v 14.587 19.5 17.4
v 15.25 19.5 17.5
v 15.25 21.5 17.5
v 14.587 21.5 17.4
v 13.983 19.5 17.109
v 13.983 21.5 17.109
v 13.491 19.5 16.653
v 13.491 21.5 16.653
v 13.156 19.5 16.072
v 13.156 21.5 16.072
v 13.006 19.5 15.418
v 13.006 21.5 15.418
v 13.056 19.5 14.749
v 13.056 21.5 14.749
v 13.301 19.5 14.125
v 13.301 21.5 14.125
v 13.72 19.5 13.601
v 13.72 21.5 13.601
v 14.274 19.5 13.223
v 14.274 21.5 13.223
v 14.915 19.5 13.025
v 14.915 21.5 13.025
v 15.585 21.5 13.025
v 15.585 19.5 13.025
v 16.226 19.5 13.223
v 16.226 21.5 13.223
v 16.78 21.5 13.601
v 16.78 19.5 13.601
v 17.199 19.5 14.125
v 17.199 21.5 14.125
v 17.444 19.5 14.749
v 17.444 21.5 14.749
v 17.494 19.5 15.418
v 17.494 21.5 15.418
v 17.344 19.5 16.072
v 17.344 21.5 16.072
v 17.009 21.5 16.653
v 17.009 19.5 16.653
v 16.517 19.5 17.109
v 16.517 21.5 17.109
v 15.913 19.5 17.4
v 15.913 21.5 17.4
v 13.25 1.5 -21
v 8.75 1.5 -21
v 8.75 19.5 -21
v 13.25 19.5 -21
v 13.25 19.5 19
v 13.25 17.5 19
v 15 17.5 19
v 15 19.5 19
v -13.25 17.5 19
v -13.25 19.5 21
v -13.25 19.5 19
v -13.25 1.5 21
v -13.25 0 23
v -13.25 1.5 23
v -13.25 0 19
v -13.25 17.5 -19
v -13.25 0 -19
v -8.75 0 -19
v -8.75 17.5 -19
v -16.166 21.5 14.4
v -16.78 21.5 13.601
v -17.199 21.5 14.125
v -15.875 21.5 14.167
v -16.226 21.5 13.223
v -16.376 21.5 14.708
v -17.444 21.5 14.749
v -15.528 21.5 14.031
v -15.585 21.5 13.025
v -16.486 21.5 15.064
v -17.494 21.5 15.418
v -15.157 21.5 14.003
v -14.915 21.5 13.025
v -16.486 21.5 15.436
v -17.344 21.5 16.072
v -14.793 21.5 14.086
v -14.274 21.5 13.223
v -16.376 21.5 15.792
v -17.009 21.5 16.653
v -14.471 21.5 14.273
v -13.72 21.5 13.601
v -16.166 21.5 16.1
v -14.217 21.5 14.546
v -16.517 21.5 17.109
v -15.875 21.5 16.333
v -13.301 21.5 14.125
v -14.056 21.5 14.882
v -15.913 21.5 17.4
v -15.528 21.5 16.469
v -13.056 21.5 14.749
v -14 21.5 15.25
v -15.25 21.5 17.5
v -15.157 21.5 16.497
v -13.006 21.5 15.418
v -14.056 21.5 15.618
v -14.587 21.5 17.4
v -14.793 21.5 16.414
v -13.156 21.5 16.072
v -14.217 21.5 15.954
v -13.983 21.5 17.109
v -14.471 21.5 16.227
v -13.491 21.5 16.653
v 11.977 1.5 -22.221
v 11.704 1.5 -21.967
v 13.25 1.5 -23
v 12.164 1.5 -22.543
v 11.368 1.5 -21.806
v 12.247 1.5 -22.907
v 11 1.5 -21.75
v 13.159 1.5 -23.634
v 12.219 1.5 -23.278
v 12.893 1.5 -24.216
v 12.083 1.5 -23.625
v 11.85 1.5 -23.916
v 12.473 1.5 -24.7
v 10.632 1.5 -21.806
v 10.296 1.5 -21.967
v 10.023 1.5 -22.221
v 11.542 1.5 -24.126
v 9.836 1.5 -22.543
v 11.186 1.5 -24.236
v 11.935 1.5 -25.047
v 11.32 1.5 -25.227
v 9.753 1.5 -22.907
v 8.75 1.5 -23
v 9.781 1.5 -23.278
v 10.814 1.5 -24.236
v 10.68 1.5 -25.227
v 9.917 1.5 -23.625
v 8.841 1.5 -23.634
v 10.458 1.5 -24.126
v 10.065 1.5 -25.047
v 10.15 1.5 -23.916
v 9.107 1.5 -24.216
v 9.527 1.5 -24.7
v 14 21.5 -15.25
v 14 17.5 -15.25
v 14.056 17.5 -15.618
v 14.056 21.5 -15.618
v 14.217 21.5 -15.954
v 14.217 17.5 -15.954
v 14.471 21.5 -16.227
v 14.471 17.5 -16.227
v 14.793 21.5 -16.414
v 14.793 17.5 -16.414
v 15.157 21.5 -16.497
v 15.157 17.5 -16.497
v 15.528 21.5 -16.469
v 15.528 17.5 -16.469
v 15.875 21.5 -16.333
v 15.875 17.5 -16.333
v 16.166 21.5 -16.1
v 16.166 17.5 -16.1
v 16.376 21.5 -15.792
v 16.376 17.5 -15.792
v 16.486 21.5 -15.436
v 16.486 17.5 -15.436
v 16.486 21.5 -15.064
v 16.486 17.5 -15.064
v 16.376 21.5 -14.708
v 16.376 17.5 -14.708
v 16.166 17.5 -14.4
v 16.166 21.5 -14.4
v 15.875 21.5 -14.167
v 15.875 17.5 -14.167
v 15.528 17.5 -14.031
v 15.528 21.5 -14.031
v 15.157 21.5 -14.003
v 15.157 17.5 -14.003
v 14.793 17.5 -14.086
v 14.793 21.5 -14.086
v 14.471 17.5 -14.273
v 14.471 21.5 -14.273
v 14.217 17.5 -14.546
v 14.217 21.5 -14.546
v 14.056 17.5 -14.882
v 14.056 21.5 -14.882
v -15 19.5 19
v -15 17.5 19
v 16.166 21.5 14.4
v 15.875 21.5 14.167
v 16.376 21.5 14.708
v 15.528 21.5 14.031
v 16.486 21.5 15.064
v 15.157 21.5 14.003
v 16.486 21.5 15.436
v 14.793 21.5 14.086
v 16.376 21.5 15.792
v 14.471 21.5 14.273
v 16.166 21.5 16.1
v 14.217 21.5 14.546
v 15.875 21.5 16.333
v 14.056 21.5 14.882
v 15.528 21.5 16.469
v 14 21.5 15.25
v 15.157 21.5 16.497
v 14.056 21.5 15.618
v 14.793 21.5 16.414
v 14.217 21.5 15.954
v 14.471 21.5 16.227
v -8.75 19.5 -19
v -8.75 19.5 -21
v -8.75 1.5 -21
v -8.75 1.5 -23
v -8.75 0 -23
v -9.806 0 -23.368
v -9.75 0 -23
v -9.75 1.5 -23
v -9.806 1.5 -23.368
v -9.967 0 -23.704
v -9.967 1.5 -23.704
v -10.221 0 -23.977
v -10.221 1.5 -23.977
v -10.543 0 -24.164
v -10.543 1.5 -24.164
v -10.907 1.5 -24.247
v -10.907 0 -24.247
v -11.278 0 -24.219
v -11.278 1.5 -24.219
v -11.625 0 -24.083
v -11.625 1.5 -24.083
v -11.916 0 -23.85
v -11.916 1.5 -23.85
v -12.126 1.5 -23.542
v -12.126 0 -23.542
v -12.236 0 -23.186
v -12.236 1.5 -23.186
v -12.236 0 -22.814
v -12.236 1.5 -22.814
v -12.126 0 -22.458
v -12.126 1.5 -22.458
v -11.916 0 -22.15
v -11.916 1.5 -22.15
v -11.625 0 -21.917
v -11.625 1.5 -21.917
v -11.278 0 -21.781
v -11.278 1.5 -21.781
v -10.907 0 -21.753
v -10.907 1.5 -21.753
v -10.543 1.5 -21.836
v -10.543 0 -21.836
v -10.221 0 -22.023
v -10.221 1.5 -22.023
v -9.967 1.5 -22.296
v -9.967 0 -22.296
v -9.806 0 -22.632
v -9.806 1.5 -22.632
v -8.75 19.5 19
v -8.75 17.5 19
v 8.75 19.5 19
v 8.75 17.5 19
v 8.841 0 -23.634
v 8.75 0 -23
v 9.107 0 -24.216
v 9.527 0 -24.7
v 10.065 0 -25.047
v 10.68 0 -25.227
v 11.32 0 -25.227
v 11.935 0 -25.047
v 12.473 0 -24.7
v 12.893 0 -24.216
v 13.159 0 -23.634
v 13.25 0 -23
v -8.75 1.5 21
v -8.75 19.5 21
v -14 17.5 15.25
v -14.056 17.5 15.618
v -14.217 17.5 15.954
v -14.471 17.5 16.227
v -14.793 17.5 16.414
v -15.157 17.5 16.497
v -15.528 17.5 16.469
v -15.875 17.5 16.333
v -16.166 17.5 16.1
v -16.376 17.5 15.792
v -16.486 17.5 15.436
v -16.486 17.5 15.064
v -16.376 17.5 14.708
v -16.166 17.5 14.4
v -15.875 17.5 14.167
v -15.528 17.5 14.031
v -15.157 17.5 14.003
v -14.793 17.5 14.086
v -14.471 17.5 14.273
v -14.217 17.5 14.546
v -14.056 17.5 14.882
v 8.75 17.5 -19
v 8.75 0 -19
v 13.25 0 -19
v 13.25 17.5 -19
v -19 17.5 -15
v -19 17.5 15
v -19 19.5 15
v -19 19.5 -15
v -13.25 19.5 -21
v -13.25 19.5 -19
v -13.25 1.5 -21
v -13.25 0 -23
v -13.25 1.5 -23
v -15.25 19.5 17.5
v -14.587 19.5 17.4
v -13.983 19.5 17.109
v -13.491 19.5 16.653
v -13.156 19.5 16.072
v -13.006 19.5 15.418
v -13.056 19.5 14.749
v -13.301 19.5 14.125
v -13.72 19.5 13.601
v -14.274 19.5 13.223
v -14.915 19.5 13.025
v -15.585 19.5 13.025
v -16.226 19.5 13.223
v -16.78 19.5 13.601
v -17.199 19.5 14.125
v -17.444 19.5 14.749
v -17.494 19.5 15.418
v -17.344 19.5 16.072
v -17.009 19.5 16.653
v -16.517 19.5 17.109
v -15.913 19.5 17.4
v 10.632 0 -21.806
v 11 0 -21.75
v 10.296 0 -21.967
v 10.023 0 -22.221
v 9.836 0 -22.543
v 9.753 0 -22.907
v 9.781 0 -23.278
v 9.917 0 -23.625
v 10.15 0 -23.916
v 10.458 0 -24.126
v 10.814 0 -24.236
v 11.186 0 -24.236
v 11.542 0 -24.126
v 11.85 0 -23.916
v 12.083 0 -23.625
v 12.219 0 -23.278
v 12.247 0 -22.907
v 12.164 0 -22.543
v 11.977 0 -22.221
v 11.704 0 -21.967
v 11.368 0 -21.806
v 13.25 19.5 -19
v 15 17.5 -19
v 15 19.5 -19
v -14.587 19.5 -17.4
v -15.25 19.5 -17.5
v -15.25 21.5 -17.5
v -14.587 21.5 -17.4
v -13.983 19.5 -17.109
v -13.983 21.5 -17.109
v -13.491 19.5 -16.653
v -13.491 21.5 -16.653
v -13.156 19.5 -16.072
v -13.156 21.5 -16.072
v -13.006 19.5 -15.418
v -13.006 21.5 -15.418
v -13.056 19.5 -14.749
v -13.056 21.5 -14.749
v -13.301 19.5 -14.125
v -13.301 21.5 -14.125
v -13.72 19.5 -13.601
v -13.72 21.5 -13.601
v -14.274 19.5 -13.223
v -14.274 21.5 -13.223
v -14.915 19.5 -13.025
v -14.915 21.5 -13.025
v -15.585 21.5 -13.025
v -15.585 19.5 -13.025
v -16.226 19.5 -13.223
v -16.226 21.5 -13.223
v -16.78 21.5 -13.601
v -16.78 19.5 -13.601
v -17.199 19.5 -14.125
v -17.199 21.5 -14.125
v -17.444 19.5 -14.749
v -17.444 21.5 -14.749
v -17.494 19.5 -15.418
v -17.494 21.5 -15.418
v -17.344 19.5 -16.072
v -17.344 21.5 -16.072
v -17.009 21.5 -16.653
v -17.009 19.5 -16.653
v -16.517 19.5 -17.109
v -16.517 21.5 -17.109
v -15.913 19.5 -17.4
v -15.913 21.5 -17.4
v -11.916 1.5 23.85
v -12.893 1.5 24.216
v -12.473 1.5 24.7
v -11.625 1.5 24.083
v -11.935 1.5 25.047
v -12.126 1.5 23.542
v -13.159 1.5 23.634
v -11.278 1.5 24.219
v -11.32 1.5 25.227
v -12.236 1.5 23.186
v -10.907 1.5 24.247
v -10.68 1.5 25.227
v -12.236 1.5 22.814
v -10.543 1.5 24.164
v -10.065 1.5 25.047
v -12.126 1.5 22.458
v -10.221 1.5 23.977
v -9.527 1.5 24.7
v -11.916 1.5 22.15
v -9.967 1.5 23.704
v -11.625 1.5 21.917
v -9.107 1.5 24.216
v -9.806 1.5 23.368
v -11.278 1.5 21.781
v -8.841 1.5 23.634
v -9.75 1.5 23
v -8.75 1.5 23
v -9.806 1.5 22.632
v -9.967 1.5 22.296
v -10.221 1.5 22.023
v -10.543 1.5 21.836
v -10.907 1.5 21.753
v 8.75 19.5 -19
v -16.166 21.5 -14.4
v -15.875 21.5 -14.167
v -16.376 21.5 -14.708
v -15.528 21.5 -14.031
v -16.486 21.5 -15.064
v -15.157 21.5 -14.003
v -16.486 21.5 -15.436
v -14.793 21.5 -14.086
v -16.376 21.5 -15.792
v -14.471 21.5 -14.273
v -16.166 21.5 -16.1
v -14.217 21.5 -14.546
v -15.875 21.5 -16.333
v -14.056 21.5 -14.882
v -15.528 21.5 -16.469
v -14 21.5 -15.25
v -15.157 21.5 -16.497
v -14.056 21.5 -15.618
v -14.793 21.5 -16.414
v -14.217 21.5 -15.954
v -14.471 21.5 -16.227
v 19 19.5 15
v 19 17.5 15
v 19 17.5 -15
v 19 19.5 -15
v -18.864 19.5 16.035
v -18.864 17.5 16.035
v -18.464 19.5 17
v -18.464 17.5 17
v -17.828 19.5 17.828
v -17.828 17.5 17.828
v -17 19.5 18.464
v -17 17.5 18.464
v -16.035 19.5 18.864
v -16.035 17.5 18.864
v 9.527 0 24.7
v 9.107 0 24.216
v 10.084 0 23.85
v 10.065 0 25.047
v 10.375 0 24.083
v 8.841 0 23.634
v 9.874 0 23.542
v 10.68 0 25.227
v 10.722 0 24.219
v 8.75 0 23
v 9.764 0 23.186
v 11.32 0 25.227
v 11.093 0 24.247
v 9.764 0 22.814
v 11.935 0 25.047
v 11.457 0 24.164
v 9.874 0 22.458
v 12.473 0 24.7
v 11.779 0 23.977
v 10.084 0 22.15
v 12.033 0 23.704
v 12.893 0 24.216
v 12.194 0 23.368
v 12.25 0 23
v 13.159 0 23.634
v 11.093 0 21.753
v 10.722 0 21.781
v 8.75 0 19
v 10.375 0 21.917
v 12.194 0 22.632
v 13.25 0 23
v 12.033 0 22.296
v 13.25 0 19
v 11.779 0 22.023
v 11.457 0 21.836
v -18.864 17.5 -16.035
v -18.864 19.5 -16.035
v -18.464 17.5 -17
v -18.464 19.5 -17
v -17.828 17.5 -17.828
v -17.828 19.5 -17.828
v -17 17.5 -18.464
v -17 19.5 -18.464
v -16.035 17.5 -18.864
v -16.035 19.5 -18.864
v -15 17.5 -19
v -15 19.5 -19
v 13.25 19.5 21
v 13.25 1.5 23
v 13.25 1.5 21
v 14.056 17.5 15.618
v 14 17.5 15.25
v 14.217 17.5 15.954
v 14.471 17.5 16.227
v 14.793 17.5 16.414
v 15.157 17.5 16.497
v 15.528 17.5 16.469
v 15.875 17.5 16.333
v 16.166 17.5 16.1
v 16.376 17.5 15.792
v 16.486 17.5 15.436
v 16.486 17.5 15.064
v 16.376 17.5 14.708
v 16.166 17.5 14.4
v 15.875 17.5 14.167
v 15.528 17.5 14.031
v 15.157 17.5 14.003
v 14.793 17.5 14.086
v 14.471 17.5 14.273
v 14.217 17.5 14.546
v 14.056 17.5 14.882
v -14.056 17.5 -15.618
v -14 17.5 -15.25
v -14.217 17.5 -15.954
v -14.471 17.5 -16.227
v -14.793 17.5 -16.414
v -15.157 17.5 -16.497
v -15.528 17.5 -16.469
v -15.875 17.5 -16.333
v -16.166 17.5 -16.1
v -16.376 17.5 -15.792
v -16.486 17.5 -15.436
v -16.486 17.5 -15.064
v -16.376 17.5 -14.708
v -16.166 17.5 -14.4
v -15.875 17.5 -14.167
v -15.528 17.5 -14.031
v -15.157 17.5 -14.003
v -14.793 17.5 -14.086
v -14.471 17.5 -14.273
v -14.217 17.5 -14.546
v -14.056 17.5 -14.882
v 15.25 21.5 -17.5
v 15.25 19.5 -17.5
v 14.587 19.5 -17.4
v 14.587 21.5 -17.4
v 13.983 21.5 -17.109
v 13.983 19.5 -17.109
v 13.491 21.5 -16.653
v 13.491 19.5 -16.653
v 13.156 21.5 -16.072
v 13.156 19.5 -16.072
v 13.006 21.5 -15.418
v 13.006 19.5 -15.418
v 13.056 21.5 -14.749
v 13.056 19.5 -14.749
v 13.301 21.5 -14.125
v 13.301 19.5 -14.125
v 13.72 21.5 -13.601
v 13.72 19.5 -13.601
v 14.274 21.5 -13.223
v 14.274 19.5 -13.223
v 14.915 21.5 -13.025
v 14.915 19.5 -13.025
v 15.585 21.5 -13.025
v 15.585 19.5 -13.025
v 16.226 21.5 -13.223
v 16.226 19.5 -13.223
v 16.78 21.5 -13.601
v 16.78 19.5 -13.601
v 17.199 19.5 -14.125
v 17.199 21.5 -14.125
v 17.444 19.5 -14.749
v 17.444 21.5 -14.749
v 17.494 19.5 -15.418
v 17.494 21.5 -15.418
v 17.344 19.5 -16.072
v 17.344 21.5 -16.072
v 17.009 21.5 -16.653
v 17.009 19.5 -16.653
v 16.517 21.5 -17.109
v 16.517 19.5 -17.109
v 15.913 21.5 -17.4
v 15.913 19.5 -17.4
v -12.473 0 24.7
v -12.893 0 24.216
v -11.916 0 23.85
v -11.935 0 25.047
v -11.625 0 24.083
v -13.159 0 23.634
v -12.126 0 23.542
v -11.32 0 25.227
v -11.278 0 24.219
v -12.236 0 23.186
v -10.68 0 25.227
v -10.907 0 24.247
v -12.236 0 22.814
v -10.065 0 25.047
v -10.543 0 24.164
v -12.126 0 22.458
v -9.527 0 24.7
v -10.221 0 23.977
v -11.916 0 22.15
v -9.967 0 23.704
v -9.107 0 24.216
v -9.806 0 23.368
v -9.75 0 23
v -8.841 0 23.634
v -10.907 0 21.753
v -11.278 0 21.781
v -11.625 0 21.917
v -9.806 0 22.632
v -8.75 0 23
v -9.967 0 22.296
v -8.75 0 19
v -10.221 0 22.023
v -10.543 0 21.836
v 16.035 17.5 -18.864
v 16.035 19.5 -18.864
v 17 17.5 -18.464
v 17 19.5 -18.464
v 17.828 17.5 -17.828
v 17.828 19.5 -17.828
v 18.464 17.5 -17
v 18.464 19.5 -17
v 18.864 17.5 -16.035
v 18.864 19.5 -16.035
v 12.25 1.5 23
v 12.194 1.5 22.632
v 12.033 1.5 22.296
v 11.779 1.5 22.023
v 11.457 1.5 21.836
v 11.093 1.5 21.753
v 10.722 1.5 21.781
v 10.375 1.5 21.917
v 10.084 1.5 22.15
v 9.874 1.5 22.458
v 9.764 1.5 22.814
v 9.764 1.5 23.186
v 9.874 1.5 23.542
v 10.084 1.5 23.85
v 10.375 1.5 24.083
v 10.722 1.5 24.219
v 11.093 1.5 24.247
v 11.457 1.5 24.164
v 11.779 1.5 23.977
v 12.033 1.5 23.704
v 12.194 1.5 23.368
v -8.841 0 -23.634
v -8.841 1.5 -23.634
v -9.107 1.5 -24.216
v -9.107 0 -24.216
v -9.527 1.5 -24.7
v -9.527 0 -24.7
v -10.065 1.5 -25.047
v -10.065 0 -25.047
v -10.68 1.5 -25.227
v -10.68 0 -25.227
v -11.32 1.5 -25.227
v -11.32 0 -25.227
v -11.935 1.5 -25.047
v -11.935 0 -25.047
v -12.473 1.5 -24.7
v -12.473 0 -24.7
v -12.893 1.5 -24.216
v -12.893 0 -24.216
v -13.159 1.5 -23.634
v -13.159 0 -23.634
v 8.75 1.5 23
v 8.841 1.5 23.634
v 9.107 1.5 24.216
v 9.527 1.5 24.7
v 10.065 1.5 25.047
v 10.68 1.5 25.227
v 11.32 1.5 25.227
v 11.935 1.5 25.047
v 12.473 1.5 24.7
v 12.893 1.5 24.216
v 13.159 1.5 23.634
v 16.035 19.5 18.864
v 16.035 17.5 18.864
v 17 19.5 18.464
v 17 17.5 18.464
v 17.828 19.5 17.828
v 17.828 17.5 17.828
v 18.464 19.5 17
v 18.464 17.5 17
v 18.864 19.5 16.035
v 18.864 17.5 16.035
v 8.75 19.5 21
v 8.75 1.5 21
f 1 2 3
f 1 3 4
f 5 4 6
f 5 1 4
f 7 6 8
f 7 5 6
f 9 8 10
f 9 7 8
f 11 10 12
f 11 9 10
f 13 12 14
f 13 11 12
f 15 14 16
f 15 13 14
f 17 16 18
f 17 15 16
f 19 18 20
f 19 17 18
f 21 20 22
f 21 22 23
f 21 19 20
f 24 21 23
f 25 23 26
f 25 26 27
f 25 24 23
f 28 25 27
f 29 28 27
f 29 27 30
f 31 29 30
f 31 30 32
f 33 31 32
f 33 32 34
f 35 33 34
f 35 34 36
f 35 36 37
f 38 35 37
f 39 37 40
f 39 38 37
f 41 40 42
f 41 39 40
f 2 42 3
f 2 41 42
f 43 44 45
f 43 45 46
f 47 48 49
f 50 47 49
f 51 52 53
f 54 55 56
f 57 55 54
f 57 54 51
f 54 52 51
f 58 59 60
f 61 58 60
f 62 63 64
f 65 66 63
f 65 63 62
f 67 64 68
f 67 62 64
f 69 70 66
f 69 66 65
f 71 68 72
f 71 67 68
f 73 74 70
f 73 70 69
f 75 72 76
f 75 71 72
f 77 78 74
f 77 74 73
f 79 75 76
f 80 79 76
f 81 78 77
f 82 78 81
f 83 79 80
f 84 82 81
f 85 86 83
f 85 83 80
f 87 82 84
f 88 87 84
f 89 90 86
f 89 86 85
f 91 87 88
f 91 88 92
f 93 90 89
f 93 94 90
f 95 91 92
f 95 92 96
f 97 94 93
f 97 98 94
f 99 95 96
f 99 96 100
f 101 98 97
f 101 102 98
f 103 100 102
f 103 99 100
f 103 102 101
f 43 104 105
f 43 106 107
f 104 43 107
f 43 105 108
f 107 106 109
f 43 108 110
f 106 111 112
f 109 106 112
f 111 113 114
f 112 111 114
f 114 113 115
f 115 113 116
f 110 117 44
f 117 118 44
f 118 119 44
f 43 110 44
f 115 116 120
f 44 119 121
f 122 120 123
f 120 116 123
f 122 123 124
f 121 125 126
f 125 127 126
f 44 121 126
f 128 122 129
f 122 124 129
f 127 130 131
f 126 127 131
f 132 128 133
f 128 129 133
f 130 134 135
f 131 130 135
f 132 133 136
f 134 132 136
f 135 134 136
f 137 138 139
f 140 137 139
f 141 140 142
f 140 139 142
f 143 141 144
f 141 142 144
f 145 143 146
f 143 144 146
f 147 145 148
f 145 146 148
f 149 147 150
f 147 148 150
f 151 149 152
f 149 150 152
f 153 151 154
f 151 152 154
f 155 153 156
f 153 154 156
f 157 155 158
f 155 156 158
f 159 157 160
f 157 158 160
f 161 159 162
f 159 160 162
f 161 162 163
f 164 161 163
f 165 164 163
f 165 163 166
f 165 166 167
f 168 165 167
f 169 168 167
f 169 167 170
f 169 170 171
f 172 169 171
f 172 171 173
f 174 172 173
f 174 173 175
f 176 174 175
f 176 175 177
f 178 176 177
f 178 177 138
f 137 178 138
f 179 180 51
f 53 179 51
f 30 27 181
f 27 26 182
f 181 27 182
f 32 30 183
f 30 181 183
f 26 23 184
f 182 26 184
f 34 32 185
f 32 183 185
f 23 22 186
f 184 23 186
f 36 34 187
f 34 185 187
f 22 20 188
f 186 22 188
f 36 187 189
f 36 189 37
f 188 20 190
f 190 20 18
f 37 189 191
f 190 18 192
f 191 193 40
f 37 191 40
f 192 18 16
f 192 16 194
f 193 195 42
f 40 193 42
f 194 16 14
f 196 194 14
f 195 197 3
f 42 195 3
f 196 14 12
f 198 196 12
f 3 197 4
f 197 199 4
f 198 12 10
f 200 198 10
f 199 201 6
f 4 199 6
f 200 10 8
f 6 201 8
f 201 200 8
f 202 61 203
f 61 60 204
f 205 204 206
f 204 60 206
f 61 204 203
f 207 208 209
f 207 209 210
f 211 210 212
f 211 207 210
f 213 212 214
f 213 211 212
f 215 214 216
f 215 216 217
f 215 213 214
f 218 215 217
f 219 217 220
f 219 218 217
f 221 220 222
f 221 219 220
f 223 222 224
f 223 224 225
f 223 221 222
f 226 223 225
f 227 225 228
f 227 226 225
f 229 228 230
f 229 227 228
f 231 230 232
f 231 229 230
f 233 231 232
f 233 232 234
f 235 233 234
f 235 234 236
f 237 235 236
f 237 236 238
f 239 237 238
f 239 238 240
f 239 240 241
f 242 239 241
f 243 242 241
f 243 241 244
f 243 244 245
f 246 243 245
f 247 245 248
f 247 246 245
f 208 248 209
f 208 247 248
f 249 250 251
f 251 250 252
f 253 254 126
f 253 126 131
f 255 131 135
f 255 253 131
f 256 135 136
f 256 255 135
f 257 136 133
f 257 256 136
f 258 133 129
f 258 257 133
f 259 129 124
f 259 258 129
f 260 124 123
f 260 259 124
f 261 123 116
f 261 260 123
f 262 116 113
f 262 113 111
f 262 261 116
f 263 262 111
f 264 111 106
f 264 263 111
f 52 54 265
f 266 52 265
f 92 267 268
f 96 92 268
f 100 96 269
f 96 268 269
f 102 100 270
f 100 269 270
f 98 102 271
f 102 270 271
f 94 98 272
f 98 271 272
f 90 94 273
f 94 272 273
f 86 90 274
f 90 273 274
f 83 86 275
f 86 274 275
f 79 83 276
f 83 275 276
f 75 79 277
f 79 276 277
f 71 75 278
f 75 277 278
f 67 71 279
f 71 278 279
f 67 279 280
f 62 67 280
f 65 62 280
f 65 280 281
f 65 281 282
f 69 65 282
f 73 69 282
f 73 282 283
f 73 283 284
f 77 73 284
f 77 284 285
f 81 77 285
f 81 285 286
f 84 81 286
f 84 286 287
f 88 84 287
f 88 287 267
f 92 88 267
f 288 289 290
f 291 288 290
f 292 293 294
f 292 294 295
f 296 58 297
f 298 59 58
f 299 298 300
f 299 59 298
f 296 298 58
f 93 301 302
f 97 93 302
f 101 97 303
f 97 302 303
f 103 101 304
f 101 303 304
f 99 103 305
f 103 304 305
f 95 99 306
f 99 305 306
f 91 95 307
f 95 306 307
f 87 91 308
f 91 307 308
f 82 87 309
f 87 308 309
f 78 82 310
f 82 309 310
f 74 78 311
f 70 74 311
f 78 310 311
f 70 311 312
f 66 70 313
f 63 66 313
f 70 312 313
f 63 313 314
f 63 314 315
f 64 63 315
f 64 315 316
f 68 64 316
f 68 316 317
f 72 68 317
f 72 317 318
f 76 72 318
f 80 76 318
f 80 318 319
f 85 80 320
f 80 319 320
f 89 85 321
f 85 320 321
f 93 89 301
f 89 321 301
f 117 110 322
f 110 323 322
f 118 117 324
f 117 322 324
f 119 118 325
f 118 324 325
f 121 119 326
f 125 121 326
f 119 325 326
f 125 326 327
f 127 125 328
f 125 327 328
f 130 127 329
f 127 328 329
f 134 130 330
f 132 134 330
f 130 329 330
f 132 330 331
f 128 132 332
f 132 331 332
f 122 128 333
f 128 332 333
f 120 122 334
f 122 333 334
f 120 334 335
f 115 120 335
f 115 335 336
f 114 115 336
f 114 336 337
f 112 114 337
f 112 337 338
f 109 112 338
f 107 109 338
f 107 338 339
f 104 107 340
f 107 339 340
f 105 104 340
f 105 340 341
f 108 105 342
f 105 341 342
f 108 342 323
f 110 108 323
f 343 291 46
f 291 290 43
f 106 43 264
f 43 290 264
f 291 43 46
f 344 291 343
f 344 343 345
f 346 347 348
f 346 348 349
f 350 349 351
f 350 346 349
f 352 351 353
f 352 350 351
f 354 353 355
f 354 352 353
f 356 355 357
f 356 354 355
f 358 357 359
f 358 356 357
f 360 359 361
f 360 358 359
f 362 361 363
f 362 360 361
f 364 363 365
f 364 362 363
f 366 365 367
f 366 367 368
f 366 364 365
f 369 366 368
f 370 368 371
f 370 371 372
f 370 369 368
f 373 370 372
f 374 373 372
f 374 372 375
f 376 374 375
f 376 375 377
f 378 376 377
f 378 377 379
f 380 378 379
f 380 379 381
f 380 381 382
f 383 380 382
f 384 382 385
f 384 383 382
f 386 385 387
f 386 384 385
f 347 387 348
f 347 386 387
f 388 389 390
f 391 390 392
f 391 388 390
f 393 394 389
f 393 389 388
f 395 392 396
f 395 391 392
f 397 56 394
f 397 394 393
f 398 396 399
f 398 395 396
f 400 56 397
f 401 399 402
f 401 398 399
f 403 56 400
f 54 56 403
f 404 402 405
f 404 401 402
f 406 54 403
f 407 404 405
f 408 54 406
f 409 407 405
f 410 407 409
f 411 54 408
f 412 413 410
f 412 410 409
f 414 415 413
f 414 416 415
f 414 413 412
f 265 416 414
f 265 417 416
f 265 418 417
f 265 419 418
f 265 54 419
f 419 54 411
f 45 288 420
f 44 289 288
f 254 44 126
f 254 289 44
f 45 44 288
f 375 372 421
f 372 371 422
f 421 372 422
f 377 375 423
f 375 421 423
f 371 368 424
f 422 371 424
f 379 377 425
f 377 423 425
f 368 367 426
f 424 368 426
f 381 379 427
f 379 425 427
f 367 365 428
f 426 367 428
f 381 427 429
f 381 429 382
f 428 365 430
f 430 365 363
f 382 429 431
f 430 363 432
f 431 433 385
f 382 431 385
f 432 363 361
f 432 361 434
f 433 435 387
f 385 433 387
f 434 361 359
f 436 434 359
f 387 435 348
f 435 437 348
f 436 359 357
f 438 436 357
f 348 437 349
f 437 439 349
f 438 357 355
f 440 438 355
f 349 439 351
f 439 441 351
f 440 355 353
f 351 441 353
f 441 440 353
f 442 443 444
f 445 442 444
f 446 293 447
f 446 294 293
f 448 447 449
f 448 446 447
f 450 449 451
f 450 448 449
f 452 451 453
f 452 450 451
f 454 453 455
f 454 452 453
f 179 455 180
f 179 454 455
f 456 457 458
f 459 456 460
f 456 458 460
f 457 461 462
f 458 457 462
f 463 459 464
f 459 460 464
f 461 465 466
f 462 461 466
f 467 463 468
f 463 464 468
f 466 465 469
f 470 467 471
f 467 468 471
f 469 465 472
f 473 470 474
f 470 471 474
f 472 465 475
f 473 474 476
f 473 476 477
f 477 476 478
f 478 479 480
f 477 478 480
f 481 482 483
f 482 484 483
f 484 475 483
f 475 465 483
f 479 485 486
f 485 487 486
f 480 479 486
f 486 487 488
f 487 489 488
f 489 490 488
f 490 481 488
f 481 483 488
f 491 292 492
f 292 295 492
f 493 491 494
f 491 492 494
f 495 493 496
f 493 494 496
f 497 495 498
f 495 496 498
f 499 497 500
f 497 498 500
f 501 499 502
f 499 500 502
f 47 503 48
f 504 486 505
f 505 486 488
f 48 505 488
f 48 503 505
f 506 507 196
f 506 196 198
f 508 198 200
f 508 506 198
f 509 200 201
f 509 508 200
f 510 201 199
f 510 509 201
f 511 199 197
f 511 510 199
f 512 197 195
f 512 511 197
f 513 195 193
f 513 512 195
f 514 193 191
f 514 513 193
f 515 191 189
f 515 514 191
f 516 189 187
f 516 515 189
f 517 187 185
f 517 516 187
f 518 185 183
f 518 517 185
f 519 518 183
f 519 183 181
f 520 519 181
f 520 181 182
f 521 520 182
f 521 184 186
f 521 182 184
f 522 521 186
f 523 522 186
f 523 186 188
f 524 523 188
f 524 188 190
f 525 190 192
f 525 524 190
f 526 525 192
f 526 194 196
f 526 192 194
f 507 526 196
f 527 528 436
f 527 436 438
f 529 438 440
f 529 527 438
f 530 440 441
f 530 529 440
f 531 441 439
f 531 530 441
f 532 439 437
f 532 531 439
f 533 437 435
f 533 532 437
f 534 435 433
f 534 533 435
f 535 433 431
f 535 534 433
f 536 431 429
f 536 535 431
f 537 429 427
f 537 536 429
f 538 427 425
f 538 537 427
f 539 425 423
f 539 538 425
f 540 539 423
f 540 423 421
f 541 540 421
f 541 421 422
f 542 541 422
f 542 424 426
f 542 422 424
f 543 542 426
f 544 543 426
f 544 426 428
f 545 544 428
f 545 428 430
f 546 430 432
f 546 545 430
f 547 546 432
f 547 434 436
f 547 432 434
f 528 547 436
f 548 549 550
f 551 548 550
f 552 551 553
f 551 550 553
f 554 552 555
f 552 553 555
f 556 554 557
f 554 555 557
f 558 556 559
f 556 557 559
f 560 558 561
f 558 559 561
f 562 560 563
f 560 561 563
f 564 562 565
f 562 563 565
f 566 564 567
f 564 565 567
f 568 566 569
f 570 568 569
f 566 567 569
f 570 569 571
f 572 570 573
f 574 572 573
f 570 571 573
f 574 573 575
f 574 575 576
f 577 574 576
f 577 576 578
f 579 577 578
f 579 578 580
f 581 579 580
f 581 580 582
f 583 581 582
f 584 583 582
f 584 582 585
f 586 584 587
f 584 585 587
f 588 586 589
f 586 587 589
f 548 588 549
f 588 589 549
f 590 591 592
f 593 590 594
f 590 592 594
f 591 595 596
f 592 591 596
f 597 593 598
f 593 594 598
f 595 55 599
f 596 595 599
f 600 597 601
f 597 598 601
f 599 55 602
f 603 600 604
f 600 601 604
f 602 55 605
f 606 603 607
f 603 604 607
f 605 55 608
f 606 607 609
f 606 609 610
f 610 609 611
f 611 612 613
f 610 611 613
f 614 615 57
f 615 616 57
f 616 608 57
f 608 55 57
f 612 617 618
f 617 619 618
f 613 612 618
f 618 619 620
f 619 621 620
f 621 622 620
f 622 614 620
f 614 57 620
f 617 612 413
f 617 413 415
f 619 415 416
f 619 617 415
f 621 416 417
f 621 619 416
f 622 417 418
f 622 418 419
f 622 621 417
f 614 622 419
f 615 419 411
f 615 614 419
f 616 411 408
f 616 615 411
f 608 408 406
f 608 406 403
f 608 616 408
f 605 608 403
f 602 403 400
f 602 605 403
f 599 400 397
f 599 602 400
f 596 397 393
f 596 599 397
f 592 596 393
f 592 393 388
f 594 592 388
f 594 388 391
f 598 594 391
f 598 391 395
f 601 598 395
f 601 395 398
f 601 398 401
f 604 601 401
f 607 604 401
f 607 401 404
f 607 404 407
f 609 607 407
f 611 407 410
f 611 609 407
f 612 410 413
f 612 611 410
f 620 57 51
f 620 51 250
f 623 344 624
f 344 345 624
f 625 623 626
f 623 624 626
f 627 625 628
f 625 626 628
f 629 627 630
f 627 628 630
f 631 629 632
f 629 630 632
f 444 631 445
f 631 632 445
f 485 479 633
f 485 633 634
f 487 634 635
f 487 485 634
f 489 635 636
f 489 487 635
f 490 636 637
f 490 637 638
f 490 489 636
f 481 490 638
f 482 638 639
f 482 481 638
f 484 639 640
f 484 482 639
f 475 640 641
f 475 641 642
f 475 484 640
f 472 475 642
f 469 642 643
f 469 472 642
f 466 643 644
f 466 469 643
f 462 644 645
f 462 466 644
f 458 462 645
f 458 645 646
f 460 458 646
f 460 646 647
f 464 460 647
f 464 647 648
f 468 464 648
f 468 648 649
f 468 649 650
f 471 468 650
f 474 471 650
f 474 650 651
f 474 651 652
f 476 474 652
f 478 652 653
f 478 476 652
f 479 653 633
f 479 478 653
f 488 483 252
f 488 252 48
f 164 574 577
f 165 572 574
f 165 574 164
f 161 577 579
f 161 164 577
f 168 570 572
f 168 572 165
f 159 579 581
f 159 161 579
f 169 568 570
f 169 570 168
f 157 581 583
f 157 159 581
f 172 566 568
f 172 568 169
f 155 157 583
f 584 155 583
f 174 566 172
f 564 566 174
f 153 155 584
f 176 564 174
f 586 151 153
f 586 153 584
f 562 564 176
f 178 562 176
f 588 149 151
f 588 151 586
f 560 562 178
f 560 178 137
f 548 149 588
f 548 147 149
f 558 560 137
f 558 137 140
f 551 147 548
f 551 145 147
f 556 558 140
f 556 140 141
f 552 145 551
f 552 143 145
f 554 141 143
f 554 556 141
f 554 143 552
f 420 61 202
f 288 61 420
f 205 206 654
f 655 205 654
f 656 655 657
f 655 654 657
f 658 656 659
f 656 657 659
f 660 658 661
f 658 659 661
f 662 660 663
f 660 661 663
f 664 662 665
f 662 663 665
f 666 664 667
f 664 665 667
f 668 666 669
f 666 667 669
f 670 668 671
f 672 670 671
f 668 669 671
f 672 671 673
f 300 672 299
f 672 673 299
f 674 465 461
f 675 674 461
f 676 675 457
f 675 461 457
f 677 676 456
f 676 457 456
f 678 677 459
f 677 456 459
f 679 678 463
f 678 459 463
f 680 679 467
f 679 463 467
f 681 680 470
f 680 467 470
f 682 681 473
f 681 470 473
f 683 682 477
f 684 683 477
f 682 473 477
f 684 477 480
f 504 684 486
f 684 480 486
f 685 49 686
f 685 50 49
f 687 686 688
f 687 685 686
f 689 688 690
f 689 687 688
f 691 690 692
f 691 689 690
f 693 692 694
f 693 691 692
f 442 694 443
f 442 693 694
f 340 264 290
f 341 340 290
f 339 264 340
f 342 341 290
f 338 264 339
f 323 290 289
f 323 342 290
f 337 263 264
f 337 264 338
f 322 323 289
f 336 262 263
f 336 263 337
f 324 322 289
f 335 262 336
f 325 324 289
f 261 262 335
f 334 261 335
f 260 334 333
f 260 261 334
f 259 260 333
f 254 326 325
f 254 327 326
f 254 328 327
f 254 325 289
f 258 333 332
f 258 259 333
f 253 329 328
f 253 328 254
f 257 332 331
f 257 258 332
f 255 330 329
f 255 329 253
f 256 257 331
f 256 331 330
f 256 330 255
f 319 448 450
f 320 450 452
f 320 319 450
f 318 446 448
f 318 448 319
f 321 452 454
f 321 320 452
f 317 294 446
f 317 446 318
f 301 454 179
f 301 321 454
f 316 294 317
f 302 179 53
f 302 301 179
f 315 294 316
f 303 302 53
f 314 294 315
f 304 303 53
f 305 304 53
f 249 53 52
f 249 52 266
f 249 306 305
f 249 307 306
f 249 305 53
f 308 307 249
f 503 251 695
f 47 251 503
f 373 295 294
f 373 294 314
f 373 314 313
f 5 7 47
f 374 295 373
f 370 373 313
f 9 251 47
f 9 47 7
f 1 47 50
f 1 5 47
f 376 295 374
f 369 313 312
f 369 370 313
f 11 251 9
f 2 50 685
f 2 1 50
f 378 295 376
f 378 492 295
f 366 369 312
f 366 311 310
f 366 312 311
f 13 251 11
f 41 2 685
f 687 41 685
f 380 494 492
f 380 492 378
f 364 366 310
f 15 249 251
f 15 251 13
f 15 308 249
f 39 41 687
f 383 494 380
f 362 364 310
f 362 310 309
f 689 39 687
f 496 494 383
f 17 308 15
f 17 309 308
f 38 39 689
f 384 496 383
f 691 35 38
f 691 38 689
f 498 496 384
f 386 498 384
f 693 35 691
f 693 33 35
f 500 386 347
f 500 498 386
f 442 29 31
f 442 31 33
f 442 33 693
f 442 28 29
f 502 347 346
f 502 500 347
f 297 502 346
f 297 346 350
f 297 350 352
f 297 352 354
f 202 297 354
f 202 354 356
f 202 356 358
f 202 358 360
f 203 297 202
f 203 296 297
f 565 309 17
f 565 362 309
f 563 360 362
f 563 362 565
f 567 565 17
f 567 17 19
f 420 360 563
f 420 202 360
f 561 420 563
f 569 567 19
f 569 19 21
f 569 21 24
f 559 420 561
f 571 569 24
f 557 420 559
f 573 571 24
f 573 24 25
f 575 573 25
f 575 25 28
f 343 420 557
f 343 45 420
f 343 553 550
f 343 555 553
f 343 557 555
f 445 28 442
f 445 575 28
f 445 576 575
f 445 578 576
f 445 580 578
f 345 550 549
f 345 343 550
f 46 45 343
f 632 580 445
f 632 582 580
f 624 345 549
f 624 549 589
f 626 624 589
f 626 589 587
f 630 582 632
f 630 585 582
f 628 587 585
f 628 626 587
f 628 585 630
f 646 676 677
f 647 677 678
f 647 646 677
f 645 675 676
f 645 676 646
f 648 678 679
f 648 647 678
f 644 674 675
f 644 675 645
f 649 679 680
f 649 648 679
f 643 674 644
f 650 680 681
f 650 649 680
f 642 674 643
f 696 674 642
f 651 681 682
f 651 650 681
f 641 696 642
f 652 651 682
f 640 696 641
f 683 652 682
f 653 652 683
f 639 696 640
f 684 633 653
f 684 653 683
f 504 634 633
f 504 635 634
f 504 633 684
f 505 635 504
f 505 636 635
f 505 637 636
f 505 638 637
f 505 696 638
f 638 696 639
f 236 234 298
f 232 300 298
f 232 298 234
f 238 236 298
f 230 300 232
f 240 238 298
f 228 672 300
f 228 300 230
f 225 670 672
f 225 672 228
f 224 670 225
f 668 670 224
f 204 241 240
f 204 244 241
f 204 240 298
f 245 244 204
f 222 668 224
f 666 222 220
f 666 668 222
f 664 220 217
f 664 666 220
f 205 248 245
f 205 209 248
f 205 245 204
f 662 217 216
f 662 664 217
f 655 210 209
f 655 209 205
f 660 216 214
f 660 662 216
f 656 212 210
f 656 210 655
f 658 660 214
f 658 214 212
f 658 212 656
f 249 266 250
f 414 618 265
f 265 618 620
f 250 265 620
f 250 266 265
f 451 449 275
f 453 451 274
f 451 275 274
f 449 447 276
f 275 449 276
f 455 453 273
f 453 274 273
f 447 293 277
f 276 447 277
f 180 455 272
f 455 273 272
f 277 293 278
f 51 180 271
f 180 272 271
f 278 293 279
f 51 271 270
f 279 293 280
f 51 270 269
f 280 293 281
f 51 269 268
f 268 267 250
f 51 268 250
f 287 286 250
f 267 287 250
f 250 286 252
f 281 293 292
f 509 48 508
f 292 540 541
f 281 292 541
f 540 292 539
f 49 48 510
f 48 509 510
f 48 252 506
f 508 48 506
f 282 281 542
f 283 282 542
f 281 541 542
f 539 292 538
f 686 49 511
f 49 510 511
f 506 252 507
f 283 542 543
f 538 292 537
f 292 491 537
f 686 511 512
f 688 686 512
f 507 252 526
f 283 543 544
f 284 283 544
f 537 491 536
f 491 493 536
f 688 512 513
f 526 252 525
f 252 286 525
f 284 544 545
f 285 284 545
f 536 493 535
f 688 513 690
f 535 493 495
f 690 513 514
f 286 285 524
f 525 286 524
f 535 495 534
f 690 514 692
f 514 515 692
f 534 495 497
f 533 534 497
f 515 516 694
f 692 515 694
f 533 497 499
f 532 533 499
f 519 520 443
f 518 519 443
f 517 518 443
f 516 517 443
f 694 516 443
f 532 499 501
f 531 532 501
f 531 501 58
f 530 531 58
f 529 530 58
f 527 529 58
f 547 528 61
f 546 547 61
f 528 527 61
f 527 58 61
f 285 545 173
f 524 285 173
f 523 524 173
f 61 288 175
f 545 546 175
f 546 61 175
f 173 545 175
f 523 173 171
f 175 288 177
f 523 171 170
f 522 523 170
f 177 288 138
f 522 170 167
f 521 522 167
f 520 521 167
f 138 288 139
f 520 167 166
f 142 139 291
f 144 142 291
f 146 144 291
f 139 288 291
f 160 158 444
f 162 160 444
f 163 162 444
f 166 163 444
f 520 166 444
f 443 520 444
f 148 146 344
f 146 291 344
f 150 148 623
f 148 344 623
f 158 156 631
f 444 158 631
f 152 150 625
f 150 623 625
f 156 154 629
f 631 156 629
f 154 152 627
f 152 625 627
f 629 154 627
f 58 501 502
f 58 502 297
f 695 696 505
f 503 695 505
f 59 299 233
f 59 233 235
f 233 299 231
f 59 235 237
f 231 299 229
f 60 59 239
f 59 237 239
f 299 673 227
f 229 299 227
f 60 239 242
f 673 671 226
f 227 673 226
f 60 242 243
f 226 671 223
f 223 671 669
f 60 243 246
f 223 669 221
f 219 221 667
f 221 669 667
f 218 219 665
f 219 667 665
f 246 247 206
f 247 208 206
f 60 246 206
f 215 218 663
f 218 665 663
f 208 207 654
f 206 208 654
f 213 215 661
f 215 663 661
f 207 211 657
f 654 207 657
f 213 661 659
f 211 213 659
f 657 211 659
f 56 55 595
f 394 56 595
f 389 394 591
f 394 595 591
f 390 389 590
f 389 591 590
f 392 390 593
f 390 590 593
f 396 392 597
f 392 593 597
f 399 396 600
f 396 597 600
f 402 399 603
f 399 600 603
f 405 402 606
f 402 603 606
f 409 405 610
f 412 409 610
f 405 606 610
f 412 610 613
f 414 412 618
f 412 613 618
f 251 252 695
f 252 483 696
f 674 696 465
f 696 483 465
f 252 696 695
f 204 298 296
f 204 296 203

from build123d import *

# Parameters (mm, degrees)
SKETCH1_W                                  = 38
SKETCH1_H                                  = 38
BOSS_EXTRUDE1_DEPTH                        = 2
SKETCH2_R                                  = 2.25
BOSS_EXTRUDE2_DEPTH                        = 2
M3_TAPPED_HOLE1_D                          = 2.5
FILLET1_R                                  = 4
BOSS_EXTRUDE3_DEPTH                        = 1.5
SKETCH9_W                                  = 1.25
SKETCH9_H                                  = 1.5
SKETCH7_W                                  = 4.5
SKETCH7_H                                  = 2
BOSS_EXTRUDE4_DEPTH                        = 18
MIRROR1_AT_THE_SECOND_PLANE_COPY_1_SKETC_R = 2.25
MIRROR1_AT_THE_SECOND_PLANE_COPY_1_DEPTH   = 2
MIRROR1_AT_THE_SECOND_PLANE_COPY_2_D       = 2.5
MIRROR3_OUTLINE_W                          = 4.5
MIRROR3_OUTLINE_H                          = 2
MIRROR3_DEPTH                              = 19.5
MIRROR3_2_OUTLINE_R                        = 1.25
MIRROR3_2_DEPTH                            = 1.5


# Read off the part's stored shape, not the designer's step: Mirror3
with BuildPart() as part:
    # Sketch1 → Boss-Extrude1 (new body)
    with BuildSketch(Plane(origin=(0, 17.5, 0), x_dir=(1, 0, 0), z_dir=(0, 1, 0))):
        Rectangle(SKETCH1_W, SKETCH1_H)
    extrude(amount=BOSS_EXTRUDE1_DEPTH)

    # Sketch2 → Boss-Extrude2 (add)
    with BuildSketch(Plane(origin=(0, 19.5, 0), x_dir=(1, 0, 0), z_dir=(0, 1, 0))):
        with Locations(Location((15.25, 15.25, 0), (0, 0, 90))):
            Circle(SKETCH2_R)
    boss_extrude2 = extrude(amount=BOSS_EXTRUDE2_DEPTH)

    # M3 Tapped Hole1 (through all)
    with Locations(Plane(origin=(0, 21.5, 0), x_dir=(1, 0, 0), z_dir=(0, 1, 0))):
        with Locations((15.25, 15.25)):
            m3_tapped_hole1 = Hole(M3_TAPPED_HOLE1_D / 2)

    # Fillet1
    fillet1_edges = [part.edges().sort_by_distance(p)[0] for p in [
        (-19, 18.5, -19),
        (-19, 18.5, 19),
        (19, 18.5, 19),
        (19, 18.5, -19),
    ]]
    fillet(fillet1_edges, radius=FILLET1_R)



with BuildPart() as body_2:
    # Sketch6 → Boss-Extrude3 (new body)
    with BuildSketch(Plane(origin=(0, 0, 0), x_dir=(1, 0, 0), z_dir=(0, 1, 0))):
        with BuildLine():
            Line((13.25, 23), (13.25, 19))
            Line((13.25, 19), (8.75, 19))
            Line((8.75, 19), (8.75, 23))
            ThreePointArc((8.75, 23), (11, 25.25), (13.25, 23))
        make_face()
    extrude(amount=BOSS_EXTRUDE3_DEPTH)

    # Sketch9 → M3 Tapped Hole2 (revolve, cut)
    with BuildSketch(Plane(origin=(11, 1.5, -23), x_dir=(0, 0, 1), z_dir=(1, 0, 0))):
        with Locations((0.625, 0.75)):
            Rectangle(SKETCH9_W, SKETCH9_H)
    revolve(axis=Axis((11, 7.85, -23), (0, -1, 0)), mode=Mode.SUBTRACT)


with BuildPart() as part_1:
    add(part.part)

    add(body_2.part)  # Boss-Extrude4 merges body 2
    # Sketch7 → Boss-Extrude4 (add)
    with BuildSketch(Plane(origin=(0, 1.5, 0), x_dir=(1, 0, 0), z_dir=(0, 1, 0))):
        with Locations((11, 20)):
            Rectangle(SKETCH7_W, SKETCH7_H)
    extrude(amount=BOSS_EXTRUDE4_DEPTH)

    # Mirror1: Boss-Extrude2, M3 Tapped Hole1 across plane
    add(boss_extrude2.mirror(Plane(origin=(0, 0, 0), x_dir=(0, 0, 1), z_dir=(1, 0, 0))))
    add(m3_tapped_hole1.mirror(Plane(origin=(0, 0, 0), x_dir=(0, 0, 1), z_dir=(1, 0, 0))), mode=Mode.SUBTRACT)

    # Mirror1 at the second plane: Boss-Extrude2, M3 Tapped Hole1 across plane
    add(boss_extrude2.mirror(Plane.XY))
    add(m3_tapped_hole1.mirror(Plane.XY), mode=Mode.SUBTRACT)

    # Mirror1 at the second plane copy 1 sketc → Mirror1 at the second plane copy 1 (add)
    with BuildSketch(Plane(origin=(0, 19.5, 0), x_dir=(-1, 0, 0), z_dir=(0, 1, 0))):
        with Locations(Location((15.25, 15.25, 0), (0, 0, 90))):
            Circle(MIRROR1_AT_THE_SECOND_PLANE_COPY_1_SKETC_R)
    extrude(amount=MIRROR1_AT_THE_SECOND_PLANE_COPY_1_DEPTH)

    # Mirror1 at the second plane copy 2 (through all)
    with Locations(Plane(origin=(0, 21.5, 0), x_dir=(-1, 0, 0), z_dir=(0, 1, 0))):
        with Locations((15.25, 15.25)):
            Hole(MIRROR1_AT_THE_SECOND_PLANE_COPY_2_D / 2)

    # Mirror3 outline → Mirror3 (add)
    with BuildSketch(Plane(origin=(0, 0, 0), x_dir=(1, 0, 0), z_dir=(0, 1, 0))):
        with Locations((-11, -20)):
            Rectangle(MIRROR3_OUTLINE_W, MIRROR3_OUTLINE_H)
        with Locations((11, -20)):
            Rectangle(MIRROR3_OUTLINE_W, MIRROR3_OUTLINE_H)
        with Locations((-11, 20)):
            Rectangle(MIRROR3_OUTLINE_W, MIRROR3_OUTLINE_H)
    extrude(amount=MIRROR3_DEPTH)

    # Mirror3 2 outline → Mirror3 2 (add)
    # profile 1 of 3: a face of its own
    with BuildSketch(Plane(origin=(0, 0, 0), x_dir=(1, 0, 0), z_dir=(0, 1, 0))):
        with BuildLine():
            Line((13.25, -23), (13.25, -21))
            Line((13.25, -21), (8.75, -21))
            Line((8.75, -21), (8.75, -23))
            ThreePointArc((8.75, -23), (11, -25.25), (13.25, -23))
        make_face()
        with Locations((11, -23)):
            Circle(MIRROR3_2_OUTLINE_R, mode=Mode.SUBTRACT)
    # profile 2 of 3: a face of its own
    with BuildSketch(Plane(origin=(0, 0, 0), x_dir=(1, 0, 0), z_dir=(0, 1, 0))):
        with BuildLine():
            Line((-8.75, -23), (-8.75, -21))
            Line((-8.75, -21), (-13.25, -21))
            Line((-13.25, -21), (-13.25, -23))
            ThreePointArc((-13.25, -23), (-11, -25.25), (-8.75, -23))
        make_face()
        with Locations((-11, -23)):
            Circle(MIRROR3_2_OUTLINE_R, mode=Mode.SUBTRACT)
    # profile 3 of 3: a face of its own
    with BuildSketch(Plane(origin=(0, 0, 0), x_dir=(1, 0, 0), z_dir=(0, 1, 0))):
        with BuildLine():
            Line((-13.25, 21), (-8.75, 21))
            Line((-8.75, 21), (-8.75, 23))
            ThreePointArc((-8.75, 23), (-11, 25.25), (-13.25, 23))
            Line((-13.25, 23), (-13.25, 21))
        make_face()
        with Locations((-11, 23)):
            Circle(MIRROR3_2_OUTLINE_R, mode=Mode.SUBTRACT)
    extrude(amount=MIRROR3_2_DEPTH)


solid = part_1.part
